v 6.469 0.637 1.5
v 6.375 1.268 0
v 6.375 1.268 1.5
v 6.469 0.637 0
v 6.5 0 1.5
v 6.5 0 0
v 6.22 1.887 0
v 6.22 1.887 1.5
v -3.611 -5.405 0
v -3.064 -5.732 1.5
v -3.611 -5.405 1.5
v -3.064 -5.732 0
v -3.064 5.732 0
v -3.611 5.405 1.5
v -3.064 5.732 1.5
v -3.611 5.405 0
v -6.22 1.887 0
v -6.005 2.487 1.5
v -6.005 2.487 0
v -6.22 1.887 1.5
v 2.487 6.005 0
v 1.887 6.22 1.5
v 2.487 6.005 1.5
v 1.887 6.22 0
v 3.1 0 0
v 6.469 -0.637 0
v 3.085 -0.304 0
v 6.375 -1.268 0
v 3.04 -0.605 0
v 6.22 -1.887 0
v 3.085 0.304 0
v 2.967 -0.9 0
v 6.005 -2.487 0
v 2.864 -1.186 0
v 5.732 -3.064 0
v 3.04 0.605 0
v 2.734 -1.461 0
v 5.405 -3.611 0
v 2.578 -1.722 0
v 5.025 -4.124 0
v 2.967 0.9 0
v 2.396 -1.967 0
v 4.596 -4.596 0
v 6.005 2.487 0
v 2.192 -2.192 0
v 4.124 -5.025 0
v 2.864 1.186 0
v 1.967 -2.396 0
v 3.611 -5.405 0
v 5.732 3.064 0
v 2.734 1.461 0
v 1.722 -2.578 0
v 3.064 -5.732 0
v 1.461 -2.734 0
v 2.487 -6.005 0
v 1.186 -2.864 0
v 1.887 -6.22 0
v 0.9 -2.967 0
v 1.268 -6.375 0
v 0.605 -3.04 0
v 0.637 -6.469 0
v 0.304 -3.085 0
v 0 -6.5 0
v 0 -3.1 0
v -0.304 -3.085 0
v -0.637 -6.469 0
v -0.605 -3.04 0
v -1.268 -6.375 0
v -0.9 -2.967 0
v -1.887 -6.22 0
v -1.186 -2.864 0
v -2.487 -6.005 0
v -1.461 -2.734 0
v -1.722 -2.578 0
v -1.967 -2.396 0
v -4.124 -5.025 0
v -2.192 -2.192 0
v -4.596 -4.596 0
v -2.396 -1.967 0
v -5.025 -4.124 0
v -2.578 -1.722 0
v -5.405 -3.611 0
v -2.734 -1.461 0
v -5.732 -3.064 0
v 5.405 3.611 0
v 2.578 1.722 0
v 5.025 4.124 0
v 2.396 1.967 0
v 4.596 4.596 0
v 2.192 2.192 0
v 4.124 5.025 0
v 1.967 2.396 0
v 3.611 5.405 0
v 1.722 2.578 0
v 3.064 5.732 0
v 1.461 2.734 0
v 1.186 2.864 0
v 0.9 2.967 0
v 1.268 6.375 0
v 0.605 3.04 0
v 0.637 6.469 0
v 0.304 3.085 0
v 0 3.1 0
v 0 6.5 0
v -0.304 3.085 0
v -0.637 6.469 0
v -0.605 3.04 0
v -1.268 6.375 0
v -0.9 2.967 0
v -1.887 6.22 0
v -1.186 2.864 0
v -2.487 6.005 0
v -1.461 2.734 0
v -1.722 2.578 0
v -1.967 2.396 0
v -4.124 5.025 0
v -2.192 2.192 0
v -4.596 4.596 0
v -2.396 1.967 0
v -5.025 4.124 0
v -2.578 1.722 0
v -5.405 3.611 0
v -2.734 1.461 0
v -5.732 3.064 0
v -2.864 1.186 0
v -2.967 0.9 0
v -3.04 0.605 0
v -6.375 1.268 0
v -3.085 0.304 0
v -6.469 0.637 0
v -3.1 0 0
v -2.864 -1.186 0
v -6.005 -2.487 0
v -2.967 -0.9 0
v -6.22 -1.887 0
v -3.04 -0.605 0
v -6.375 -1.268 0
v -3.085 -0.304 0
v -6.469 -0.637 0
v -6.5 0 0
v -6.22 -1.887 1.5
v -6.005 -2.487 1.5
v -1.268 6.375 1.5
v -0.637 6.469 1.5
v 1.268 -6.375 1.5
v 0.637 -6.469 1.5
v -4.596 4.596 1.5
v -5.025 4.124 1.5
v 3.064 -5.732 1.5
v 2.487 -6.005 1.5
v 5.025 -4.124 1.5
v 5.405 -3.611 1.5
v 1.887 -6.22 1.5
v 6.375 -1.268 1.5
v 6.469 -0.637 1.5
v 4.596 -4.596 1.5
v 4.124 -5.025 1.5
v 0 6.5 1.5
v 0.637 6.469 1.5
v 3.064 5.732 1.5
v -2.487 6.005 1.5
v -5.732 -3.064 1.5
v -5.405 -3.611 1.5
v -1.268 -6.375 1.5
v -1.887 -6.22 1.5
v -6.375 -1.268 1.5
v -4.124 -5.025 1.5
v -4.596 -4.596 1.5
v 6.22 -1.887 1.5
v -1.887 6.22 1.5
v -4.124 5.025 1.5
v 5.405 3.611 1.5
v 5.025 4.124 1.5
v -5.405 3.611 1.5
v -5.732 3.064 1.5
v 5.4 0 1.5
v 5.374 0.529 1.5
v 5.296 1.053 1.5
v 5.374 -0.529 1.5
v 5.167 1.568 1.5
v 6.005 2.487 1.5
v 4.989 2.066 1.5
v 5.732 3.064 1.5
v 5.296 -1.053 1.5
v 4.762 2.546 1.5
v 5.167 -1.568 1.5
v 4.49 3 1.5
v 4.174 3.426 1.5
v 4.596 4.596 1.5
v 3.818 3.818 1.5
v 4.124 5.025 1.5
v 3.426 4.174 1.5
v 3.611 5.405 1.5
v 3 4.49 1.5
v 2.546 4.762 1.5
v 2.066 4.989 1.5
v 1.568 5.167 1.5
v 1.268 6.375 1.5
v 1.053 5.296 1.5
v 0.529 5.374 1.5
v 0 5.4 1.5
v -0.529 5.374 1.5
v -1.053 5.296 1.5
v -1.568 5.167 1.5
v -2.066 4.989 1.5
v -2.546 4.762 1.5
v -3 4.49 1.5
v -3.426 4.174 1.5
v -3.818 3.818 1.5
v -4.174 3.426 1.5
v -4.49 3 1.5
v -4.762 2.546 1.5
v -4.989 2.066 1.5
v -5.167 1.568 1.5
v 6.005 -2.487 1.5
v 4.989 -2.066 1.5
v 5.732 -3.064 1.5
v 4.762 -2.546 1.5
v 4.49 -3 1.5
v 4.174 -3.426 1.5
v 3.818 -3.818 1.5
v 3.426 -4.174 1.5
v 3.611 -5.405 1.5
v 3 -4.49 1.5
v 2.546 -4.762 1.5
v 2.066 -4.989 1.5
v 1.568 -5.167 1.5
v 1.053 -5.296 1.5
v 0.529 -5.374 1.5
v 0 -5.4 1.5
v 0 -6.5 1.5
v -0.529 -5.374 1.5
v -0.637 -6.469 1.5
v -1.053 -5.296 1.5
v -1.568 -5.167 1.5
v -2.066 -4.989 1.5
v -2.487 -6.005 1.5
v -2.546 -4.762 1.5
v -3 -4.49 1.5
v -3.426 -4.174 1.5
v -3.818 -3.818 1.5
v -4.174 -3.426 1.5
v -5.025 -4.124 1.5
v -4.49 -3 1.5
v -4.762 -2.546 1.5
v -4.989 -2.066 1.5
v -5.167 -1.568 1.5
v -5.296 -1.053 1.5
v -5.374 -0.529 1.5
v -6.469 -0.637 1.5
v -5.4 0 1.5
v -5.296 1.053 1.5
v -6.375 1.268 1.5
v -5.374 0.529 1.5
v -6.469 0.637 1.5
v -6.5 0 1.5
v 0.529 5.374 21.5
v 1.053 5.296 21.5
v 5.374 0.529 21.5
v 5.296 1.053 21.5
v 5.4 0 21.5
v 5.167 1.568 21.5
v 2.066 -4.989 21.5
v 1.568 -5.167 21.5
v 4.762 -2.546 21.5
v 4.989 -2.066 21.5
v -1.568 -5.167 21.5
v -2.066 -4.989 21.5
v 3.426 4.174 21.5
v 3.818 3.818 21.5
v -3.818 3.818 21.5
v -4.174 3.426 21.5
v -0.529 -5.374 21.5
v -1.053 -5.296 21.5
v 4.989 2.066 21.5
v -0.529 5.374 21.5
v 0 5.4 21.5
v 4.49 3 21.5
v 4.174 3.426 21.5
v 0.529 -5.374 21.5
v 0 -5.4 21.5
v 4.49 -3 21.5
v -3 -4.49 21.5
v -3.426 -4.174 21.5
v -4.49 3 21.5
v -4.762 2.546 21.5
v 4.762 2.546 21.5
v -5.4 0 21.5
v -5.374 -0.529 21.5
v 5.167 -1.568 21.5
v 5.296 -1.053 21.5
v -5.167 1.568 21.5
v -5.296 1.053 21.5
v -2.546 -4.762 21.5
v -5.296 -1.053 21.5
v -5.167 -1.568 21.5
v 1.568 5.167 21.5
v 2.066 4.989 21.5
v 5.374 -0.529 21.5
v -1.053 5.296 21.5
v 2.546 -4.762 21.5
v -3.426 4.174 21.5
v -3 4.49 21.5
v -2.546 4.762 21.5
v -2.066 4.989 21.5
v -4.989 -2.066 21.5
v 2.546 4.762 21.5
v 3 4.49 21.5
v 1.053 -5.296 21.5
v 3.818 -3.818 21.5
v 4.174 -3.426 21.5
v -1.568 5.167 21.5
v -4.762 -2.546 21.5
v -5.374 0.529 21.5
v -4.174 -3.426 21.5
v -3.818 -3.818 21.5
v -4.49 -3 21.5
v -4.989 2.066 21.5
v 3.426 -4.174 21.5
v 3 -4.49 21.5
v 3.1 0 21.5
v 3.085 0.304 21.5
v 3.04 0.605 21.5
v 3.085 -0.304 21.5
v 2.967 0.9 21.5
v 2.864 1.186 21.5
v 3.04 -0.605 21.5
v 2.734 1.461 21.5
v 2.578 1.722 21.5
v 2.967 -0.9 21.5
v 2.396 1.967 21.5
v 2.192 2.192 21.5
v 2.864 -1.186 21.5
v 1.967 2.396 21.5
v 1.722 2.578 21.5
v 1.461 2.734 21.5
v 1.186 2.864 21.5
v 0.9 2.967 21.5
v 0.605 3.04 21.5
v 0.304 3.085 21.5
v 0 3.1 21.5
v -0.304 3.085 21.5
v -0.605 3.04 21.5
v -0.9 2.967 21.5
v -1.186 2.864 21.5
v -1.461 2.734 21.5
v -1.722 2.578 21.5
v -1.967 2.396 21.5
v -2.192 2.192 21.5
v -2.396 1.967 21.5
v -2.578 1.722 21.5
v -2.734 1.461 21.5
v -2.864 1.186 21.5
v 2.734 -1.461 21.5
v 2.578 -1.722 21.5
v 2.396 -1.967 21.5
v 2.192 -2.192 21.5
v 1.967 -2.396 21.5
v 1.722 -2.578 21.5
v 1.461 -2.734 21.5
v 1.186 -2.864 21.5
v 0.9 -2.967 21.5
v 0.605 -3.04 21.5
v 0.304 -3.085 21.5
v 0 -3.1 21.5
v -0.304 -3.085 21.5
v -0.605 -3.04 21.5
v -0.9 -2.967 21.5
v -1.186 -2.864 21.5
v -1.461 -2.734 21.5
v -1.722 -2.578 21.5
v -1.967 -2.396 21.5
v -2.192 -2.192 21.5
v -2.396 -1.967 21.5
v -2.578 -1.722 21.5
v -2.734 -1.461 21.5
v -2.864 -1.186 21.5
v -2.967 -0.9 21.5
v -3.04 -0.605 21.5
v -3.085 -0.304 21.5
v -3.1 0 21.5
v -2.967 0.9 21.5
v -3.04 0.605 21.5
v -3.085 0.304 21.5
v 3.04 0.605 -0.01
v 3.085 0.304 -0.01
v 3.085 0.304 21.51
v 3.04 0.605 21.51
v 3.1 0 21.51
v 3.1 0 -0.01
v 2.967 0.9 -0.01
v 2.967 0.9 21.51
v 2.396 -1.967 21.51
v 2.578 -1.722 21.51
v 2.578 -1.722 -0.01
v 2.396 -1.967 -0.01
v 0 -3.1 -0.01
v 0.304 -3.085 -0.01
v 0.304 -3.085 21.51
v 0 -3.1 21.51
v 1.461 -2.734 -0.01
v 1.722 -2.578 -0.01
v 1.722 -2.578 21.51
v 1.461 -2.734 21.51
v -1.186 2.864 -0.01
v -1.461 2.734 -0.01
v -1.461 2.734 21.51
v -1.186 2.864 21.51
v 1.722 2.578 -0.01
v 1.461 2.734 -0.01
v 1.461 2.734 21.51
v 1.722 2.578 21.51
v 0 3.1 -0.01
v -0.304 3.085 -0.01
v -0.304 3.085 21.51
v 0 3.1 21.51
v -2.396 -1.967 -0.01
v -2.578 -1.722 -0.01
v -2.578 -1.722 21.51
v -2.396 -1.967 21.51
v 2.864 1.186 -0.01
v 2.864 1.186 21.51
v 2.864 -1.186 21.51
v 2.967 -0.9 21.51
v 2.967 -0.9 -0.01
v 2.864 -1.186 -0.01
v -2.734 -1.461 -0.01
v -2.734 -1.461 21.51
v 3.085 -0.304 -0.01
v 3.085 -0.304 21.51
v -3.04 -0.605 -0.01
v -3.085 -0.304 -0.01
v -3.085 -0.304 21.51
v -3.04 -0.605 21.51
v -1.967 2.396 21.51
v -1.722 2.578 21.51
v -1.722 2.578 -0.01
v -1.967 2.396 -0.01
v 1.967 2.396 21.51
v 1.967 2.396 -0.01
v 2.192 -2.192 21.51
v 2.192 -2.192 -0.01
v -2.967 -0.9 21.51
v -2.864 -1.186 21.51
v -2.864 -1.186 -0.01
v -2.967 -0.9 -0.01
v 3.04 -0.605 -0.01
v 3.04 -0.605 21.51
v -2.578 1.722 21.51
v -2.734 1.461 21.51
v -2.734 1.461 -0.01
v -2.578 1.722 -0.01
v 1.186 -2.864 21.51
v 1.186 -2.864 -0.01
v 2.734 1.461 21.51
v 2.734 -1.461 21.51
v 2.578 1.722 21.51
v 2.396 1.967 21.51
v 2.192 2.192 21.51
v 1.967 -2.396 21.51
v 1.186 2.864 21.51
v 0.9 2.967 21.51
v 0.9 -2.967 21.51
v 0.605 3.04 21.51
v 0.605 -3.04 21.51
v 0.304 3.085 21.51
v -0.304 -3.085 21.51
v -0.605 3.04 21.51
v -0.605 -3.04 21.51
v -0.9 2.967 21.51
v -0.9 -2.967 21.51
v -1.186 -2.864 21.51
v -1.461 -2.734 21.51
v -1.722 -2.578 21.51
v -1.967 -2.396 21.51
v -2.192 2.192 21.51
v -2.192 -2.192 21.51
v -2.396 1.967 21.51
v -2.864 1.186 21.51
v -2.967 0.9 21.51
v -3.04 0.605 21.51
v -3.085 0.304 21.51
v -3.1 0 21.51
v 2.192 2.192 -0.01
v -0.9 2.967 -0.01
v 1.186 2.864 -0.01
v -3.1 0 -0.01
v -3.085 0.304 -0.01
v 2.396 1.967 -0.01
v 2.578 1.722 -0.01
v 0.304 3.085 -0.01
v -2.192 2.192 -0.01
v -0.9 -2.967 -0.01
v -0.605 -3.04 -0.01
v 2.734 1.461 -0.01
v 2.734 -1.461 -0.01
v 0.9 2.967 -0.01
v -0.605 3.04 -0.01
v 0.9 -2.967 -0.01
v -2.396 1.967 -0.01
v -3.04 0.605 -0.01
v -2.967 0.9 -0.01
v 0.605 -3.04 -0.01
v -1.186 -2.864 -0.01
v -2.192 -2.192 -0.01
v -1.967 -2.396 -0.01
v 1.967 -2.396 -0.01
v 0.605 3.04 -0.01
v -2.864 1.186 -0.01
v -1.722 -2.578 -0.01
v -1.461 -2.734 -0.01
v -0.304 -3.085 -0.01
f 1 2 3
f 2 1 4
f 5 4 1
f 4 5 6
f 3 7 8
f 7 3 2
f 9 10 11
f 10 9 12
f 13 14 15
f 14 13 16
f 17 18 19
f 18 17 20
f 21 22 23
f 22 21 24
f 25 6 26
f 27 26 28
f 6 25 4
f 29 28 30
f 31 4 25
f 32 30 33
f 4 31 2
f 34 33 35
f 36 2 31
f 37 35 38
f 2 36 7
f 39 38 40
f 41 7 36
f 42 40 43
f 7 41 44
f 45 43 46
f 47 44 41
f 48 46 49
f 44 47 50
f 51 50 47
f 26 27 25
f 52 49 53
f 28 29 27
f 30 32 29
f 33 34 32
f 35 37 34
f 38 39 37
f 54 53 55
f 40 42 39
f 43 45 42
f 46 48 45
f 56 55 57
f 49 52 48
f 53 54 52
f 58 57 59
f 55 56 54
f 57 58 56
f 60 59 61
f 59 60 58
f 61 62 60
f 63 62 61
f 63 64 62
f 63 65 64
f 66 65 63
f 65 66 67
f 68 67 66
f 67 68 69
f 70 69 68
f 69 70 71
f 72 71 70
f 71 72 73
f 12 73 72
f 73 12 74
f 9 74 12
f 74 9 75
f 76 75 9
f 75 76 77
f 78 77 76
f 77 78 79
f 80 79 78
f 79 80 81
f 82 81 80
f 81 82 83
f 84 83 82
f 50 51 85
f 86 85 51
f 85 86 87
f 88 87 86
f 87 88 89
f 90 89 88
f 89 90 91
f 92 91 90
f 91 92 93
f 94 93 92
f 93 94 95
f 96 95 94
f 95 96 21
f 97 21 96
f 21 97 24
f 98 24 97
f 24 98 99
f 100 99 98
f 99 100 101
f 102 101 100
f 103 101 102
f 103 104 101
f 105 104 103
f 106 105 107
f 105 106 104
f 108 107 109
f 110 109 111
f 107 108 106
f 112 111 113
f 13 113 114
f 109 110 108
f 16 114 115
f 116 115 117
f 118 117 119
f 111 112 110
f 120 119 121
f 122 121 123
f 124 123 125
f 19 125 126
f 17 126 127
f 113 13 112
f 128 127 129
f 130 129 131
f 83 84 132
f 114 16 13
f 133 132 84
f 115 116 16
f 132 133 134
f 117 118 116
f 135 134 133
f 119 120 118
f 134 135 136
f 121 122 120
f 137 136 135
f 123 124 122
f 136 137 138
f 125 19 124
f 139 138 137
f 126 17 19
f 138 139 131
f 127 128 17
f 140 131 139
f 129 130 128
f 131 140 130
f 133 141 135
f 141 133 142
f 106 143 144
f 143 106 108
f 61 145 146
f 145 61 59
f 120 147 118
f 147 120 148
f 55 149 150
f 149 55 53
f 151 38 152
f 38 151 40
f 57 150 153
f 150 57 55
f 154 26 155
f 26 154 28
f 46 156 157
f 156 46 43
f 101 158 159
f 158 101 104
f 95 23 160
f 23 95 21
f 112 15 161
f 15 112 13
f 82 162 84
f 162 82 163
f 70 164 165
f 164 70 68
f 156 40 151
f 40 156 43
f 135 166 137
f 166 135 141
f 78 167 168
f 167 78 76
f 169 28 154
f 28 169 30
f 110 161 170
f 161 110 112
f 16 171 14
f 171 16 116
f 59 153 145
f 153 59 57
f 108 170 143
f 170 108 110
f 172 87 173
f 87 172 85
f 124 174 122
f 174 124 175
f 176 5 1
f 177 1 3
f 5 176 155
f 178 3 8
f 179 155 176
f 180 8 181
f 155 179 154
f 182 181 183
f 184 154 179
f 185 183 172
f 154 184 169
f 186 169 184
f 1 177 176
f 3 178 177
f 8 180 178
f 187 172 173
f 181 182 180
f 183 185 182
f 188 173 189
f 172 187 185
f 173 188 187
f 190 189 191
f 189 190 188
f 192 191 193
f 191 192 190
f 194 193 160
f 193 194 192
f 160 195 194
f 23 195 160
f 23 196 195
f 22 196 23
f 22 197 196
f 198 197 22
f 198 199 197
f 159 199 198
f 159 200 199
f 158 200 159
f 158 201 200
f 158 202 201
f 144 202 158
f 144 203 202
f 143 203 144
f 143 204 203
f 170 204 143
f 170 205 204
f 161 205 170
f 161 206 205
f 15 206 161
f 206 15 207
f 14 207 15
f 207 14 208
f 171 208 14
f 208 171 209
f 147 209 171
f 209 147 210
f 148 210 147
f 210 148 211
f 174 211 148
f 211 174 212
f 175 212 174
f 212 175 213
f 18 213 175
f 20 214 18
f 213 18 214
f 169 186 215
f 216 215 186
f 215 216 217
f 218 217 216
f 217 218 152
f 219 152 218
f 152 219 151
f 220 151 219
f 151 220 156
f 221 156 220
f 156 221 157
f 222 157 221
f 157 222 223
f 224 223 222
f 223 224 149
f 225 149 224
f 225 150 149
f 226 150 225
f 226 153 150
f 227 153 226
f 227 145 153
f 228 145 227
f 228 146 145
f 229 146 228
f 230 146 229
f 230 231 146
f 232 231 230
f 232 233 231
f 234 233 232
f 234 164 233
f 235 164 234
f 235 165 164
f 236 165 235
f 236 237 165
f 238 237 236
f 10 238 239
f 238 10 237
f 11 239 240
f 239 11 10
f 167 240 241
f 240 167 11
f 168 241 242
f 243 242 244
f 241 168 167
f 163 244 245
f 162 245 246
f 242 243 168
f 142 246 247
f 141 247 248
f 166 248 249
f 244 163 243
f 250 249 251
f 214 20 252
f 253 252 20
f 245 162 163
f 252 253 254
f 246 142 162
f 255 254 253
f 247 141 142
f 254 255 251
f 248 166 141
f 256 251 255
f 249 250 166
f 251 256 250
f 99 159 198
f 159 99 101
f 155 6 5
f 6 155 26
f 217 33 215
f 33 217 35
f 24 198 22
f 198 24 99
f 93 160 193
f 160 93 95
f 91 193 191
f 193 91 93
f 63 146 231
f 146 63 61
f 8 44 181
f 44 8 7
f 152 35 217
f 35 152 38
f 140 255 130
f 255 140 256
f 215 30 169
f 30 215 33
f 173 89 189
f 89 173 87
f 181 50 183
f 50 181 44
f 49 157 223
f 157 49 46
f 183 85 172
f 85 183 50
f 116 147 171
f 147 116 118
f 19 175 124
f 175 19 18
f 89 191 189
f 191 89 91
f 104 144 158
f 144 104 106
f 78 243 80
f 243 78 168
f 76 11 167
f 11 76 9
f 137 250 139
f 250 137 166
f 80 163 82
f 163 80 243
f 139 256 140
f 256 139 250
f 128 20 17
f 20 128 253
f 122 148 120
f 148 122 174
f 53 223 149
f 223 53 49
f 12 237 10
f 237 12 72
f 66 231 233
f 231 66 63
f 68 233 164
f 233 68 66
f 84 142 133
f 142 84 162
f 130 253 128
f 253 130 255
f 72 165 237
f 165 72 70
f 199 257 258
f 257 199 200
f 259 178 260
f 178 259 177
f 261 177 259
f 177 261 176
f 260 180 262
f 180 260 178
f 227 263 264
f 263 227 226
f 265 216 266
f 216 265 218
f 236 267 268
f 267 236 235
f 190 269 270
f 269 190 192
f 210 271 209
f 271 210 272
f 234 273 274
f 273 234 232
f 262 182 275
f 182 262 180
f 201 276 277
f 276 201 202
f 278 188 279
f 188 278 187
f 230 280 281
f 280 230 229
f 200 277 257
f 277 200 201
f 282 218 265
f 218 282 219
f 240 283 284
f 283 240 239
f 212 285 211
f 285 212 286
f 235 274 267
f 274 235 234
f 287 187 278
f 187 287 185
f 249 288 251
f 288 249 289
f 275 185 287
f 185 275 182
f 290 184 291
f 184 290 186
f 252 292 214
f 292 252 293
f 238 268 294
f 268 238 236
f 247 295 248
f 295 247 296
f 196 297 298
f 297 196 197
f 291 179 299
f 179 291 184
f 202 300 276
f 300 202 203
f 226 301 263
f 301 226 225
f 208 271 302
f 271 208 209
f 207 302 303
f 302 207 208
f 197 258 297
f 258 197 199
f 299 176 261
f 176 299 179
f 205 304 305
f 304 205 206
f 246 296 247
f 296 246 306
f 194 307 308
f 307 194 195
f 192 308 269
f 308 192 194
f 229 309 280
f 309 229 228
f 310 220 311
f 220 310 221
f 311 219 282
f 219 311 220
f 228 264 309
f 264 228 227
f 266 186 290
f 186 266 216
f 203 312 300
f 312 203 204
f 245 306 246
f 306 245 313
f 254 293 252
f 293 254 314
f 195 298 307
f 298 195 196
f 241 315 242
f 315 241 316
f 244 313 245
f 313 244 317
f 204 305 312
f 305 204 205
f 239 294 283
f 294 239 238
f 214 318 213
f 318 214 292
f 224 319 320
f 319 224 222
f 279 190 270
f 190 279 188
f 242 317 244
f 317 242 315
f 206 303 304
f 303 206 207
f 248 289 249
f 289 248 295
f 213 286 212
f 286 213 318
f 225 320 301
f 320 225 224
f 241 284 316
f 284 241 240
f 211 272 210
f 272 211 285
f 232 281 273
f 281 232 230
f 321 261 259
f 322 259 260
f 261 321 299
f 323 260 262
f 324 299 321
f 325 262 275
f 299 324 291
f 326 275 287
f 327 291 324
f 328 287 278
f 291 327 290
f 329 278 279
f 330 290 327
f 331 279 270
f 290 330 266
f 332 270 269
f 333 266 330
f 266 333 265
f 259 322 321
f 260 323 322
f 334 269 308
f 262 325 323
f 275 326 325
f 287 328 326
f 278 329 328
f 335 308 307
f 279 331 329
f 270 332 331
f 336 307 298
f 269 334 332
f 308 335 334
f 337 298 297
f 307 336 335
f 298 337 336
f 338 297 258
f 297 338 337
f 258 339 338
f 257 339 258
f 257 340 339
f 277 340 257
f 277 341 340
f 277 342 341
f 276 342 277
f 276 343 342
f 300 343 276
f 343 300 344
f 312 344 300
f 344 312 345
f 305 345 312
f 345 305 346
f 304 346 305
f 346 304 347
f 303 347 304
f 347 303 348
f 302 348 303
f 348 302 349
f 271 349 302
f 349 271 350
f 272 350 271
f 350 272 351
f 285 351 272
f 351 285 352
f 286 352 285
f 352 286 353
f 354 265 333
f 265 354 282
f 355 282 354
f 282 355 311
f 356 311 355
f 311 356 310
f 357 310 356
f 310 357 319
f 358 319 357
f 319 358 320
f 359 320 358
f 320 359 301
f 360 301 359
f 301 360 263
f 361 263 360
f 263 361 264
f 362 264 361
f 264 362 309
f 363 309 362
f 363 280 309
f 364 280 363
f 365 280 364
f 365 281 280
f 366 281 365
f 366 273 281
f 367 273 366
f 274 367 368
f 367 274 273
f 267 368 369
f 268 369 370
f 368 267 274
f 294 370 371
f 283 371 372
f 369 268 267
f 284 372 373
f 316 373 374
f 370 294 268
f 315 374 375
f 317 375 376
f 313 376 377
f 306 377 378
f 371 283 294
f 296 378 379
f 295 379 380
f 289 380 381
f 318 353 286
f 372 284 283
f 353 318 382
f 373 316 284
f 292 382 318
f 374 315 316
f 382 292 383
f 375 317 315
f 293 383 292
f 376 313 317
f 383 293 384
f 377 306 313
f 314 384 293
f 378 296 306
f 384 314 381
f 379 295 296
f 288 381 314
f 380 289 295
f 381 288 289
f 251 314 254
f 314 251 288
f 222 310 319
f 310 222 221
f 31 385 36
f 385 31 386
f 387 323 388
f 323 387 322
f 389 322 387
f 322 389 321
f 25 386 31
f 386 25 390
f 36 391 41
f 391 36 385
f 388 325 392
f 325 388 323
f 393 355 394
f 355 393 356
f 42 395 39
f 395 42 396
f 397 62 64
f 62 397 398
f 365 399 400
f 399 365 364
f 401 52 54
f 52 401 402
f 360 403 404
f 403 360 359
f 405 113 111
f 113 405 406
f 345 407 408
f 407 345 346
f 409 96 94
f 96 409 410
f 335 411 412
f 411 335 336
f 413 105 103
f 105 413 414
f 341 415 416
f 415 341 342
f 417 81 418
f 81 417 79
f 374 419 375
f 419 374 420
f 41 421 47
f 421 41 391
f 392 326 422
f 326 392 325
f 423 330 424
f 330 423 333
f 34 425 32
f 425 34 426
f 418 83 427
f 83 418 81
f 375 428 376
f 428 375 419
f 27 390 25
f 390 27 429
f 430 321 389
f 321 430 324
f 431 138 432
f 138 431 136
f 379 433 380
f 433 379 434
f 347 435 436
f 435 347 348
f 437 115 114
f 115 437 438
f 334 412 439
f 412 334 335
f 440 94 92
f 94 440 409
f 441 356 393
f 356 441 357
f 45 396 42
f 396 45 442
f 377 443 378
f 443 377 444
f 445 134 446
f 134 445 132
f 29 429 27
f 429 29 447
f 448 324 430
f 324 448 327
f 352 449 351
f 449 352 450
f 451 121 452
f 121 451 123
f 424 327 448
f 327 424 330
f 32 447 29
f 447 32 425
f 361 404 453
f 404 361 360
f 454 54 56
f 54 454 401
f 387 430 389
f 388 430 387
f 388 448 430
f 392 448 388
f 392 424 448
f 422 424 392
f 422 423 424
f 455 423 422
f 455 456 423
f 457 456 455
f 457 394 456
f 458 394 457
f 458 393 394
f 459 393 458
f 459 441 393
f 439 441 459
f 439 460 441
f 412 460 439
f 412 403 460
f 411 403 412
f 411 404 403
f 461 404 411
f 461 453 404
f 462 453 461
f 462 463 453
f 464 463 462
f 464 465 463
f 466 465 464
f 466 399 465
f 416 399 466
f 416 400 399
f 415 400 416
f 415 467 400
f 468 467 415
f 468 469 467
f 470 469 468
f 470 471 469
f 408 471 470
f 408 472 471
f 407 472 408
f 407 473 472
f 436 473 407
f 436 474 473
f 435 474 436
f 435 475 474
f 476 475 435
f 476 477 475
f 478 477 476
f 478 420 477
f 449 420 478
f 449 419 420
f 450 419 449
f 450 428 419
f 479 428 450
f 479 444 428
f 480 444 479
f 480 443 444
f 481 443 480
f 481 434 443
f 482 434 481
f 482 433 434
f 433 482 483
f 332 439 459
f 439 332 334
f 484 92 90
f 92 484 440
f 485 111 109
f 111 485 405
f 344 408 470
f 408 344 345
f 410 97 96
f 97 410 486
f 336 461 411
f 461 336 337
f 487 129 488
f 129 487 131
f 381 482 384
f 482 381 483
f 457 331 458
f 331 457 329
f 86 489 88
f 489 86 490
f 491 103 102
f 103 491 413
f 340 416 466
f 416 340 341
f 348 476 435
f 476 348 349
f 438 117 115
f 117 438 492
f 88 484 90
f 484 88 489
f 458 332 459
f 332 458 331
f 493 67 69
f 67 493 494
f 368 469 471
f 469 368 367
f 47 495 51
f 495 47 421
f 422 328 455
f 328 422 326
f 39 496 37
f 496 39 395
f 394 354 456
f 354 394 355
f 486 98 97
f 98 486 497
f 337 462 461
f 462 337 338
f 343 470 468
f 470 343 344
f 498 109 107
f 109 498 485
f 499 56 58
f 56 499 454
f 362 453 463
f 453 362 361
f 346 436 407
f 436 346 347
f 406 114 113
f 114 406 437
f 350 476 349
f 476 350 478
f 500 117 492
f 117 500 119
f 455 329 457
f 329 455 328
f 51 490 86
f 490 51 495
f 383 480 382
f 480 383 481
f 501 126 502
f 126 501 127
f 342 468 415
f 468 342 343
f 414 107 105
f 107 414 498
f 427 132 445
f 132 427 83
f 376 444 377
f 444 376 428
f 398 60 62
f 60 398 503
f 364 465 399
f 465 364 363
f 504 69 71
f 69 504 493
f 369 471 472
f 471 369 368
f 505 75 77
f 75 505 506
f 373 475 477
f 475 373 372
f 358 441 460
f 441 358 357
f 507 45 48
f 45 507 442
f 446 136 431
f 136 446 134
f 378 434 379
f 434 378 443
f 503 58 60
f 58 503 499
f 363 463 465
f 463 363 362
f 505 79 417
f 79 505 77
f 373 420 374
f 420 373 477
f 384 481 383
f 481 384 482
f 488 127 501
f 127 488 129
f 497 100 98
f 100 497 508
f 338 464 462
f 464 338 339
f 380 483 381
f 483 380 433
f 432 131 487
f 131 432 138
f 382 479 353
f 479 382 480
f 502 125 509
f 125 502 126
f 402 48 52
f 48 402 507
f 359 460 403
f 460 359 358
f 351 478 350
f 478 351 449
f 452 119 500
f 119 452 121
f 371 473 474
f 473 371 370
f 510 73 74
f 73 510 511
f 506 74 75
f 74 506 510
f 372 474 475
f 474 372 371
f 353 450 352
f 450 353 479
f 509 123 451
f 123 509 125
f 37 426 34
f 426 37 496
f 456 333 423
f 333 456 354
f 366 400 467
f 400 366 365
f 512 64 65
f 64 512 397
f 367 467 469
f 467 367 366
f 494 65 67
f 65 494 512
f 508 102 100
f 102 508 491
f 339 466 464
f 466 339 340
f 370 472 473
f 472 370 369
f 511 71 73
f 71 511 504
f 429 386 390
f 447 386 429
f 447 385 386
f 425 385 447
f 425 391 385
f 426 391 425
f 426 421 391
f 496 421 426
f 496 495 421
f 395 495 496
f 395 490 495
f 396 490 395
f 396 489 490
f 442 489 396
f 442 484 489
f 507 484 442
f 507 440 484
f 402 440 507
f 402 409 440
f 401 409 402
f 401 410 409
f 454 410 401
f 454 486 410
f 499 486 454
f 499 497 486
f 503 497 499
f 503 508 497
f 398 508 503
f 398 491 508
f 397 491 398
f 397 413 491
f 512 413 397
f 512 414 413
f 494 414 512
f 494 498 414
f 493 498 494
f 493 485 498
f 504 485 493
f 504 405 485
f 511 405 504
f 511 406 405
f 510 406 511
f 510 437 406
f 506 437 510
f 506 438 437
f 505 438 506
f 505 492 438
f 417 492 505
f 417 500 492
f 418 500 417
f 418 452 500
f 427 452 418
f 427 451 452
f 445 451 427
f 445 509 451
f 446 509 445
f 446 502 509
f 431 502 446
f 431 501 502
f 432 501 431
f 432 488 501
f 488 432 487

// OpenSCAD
// Adapter sleeve for 0.2 mL PCR tube in 1.5 mL rack hole
// Print orientation: upside down (collar on bed, sleeve rises upward)

// Dimensions
collar_diameter = 13;        // mm, outer diameter of collar
collar_thickness = 1.5;      // mm, height of collar
sleeve_outer_diameter = 10.8; // mm, outer diameter of sleeve body
sleeve_body_height = 20.0;   // mm, height of sleeve body (21.5 total - 1.5 collar = 20.0)
bore_diameter = 6.2;         // mm, inner bore diameter

// Set resolution for curves
$fn = 64;

// Collar (bottom part)
collar_radius = collar_diameter / 2;

// Sleeve body (upper part)
sleeve_radius = sleeve_outer_diameter / 2;
total_height = collar_thickness + sleeve_body_height;

// Bore (full height)
bore_radius = bore_diameter / 2;

// Build adapter sleeve
module adapter_sleeve() {
    // Collar base (from z=0 to z=collar_thickness)
    translate([0, 0, 0]) {
        cylinder(h = collar_thickness, r = collar_radius, center = false);
    }
    
    // Sleeve body (from z=collar_thickness to z=total_height)
    translate([0, 0, collar_thickness]) {
        cylinder(h = sleeve_body_height, r = sleeve_radius, center = false);
    }
    
    // Bore (subtract cylinder from center, extending past both ends)
    translate([0, 0, -0.01]) {
        cylinder(h = total_height + 0.02, r = bore_radius, center = false);
    }
}

// Render the adapter sleeve
adapter_sleeve();
